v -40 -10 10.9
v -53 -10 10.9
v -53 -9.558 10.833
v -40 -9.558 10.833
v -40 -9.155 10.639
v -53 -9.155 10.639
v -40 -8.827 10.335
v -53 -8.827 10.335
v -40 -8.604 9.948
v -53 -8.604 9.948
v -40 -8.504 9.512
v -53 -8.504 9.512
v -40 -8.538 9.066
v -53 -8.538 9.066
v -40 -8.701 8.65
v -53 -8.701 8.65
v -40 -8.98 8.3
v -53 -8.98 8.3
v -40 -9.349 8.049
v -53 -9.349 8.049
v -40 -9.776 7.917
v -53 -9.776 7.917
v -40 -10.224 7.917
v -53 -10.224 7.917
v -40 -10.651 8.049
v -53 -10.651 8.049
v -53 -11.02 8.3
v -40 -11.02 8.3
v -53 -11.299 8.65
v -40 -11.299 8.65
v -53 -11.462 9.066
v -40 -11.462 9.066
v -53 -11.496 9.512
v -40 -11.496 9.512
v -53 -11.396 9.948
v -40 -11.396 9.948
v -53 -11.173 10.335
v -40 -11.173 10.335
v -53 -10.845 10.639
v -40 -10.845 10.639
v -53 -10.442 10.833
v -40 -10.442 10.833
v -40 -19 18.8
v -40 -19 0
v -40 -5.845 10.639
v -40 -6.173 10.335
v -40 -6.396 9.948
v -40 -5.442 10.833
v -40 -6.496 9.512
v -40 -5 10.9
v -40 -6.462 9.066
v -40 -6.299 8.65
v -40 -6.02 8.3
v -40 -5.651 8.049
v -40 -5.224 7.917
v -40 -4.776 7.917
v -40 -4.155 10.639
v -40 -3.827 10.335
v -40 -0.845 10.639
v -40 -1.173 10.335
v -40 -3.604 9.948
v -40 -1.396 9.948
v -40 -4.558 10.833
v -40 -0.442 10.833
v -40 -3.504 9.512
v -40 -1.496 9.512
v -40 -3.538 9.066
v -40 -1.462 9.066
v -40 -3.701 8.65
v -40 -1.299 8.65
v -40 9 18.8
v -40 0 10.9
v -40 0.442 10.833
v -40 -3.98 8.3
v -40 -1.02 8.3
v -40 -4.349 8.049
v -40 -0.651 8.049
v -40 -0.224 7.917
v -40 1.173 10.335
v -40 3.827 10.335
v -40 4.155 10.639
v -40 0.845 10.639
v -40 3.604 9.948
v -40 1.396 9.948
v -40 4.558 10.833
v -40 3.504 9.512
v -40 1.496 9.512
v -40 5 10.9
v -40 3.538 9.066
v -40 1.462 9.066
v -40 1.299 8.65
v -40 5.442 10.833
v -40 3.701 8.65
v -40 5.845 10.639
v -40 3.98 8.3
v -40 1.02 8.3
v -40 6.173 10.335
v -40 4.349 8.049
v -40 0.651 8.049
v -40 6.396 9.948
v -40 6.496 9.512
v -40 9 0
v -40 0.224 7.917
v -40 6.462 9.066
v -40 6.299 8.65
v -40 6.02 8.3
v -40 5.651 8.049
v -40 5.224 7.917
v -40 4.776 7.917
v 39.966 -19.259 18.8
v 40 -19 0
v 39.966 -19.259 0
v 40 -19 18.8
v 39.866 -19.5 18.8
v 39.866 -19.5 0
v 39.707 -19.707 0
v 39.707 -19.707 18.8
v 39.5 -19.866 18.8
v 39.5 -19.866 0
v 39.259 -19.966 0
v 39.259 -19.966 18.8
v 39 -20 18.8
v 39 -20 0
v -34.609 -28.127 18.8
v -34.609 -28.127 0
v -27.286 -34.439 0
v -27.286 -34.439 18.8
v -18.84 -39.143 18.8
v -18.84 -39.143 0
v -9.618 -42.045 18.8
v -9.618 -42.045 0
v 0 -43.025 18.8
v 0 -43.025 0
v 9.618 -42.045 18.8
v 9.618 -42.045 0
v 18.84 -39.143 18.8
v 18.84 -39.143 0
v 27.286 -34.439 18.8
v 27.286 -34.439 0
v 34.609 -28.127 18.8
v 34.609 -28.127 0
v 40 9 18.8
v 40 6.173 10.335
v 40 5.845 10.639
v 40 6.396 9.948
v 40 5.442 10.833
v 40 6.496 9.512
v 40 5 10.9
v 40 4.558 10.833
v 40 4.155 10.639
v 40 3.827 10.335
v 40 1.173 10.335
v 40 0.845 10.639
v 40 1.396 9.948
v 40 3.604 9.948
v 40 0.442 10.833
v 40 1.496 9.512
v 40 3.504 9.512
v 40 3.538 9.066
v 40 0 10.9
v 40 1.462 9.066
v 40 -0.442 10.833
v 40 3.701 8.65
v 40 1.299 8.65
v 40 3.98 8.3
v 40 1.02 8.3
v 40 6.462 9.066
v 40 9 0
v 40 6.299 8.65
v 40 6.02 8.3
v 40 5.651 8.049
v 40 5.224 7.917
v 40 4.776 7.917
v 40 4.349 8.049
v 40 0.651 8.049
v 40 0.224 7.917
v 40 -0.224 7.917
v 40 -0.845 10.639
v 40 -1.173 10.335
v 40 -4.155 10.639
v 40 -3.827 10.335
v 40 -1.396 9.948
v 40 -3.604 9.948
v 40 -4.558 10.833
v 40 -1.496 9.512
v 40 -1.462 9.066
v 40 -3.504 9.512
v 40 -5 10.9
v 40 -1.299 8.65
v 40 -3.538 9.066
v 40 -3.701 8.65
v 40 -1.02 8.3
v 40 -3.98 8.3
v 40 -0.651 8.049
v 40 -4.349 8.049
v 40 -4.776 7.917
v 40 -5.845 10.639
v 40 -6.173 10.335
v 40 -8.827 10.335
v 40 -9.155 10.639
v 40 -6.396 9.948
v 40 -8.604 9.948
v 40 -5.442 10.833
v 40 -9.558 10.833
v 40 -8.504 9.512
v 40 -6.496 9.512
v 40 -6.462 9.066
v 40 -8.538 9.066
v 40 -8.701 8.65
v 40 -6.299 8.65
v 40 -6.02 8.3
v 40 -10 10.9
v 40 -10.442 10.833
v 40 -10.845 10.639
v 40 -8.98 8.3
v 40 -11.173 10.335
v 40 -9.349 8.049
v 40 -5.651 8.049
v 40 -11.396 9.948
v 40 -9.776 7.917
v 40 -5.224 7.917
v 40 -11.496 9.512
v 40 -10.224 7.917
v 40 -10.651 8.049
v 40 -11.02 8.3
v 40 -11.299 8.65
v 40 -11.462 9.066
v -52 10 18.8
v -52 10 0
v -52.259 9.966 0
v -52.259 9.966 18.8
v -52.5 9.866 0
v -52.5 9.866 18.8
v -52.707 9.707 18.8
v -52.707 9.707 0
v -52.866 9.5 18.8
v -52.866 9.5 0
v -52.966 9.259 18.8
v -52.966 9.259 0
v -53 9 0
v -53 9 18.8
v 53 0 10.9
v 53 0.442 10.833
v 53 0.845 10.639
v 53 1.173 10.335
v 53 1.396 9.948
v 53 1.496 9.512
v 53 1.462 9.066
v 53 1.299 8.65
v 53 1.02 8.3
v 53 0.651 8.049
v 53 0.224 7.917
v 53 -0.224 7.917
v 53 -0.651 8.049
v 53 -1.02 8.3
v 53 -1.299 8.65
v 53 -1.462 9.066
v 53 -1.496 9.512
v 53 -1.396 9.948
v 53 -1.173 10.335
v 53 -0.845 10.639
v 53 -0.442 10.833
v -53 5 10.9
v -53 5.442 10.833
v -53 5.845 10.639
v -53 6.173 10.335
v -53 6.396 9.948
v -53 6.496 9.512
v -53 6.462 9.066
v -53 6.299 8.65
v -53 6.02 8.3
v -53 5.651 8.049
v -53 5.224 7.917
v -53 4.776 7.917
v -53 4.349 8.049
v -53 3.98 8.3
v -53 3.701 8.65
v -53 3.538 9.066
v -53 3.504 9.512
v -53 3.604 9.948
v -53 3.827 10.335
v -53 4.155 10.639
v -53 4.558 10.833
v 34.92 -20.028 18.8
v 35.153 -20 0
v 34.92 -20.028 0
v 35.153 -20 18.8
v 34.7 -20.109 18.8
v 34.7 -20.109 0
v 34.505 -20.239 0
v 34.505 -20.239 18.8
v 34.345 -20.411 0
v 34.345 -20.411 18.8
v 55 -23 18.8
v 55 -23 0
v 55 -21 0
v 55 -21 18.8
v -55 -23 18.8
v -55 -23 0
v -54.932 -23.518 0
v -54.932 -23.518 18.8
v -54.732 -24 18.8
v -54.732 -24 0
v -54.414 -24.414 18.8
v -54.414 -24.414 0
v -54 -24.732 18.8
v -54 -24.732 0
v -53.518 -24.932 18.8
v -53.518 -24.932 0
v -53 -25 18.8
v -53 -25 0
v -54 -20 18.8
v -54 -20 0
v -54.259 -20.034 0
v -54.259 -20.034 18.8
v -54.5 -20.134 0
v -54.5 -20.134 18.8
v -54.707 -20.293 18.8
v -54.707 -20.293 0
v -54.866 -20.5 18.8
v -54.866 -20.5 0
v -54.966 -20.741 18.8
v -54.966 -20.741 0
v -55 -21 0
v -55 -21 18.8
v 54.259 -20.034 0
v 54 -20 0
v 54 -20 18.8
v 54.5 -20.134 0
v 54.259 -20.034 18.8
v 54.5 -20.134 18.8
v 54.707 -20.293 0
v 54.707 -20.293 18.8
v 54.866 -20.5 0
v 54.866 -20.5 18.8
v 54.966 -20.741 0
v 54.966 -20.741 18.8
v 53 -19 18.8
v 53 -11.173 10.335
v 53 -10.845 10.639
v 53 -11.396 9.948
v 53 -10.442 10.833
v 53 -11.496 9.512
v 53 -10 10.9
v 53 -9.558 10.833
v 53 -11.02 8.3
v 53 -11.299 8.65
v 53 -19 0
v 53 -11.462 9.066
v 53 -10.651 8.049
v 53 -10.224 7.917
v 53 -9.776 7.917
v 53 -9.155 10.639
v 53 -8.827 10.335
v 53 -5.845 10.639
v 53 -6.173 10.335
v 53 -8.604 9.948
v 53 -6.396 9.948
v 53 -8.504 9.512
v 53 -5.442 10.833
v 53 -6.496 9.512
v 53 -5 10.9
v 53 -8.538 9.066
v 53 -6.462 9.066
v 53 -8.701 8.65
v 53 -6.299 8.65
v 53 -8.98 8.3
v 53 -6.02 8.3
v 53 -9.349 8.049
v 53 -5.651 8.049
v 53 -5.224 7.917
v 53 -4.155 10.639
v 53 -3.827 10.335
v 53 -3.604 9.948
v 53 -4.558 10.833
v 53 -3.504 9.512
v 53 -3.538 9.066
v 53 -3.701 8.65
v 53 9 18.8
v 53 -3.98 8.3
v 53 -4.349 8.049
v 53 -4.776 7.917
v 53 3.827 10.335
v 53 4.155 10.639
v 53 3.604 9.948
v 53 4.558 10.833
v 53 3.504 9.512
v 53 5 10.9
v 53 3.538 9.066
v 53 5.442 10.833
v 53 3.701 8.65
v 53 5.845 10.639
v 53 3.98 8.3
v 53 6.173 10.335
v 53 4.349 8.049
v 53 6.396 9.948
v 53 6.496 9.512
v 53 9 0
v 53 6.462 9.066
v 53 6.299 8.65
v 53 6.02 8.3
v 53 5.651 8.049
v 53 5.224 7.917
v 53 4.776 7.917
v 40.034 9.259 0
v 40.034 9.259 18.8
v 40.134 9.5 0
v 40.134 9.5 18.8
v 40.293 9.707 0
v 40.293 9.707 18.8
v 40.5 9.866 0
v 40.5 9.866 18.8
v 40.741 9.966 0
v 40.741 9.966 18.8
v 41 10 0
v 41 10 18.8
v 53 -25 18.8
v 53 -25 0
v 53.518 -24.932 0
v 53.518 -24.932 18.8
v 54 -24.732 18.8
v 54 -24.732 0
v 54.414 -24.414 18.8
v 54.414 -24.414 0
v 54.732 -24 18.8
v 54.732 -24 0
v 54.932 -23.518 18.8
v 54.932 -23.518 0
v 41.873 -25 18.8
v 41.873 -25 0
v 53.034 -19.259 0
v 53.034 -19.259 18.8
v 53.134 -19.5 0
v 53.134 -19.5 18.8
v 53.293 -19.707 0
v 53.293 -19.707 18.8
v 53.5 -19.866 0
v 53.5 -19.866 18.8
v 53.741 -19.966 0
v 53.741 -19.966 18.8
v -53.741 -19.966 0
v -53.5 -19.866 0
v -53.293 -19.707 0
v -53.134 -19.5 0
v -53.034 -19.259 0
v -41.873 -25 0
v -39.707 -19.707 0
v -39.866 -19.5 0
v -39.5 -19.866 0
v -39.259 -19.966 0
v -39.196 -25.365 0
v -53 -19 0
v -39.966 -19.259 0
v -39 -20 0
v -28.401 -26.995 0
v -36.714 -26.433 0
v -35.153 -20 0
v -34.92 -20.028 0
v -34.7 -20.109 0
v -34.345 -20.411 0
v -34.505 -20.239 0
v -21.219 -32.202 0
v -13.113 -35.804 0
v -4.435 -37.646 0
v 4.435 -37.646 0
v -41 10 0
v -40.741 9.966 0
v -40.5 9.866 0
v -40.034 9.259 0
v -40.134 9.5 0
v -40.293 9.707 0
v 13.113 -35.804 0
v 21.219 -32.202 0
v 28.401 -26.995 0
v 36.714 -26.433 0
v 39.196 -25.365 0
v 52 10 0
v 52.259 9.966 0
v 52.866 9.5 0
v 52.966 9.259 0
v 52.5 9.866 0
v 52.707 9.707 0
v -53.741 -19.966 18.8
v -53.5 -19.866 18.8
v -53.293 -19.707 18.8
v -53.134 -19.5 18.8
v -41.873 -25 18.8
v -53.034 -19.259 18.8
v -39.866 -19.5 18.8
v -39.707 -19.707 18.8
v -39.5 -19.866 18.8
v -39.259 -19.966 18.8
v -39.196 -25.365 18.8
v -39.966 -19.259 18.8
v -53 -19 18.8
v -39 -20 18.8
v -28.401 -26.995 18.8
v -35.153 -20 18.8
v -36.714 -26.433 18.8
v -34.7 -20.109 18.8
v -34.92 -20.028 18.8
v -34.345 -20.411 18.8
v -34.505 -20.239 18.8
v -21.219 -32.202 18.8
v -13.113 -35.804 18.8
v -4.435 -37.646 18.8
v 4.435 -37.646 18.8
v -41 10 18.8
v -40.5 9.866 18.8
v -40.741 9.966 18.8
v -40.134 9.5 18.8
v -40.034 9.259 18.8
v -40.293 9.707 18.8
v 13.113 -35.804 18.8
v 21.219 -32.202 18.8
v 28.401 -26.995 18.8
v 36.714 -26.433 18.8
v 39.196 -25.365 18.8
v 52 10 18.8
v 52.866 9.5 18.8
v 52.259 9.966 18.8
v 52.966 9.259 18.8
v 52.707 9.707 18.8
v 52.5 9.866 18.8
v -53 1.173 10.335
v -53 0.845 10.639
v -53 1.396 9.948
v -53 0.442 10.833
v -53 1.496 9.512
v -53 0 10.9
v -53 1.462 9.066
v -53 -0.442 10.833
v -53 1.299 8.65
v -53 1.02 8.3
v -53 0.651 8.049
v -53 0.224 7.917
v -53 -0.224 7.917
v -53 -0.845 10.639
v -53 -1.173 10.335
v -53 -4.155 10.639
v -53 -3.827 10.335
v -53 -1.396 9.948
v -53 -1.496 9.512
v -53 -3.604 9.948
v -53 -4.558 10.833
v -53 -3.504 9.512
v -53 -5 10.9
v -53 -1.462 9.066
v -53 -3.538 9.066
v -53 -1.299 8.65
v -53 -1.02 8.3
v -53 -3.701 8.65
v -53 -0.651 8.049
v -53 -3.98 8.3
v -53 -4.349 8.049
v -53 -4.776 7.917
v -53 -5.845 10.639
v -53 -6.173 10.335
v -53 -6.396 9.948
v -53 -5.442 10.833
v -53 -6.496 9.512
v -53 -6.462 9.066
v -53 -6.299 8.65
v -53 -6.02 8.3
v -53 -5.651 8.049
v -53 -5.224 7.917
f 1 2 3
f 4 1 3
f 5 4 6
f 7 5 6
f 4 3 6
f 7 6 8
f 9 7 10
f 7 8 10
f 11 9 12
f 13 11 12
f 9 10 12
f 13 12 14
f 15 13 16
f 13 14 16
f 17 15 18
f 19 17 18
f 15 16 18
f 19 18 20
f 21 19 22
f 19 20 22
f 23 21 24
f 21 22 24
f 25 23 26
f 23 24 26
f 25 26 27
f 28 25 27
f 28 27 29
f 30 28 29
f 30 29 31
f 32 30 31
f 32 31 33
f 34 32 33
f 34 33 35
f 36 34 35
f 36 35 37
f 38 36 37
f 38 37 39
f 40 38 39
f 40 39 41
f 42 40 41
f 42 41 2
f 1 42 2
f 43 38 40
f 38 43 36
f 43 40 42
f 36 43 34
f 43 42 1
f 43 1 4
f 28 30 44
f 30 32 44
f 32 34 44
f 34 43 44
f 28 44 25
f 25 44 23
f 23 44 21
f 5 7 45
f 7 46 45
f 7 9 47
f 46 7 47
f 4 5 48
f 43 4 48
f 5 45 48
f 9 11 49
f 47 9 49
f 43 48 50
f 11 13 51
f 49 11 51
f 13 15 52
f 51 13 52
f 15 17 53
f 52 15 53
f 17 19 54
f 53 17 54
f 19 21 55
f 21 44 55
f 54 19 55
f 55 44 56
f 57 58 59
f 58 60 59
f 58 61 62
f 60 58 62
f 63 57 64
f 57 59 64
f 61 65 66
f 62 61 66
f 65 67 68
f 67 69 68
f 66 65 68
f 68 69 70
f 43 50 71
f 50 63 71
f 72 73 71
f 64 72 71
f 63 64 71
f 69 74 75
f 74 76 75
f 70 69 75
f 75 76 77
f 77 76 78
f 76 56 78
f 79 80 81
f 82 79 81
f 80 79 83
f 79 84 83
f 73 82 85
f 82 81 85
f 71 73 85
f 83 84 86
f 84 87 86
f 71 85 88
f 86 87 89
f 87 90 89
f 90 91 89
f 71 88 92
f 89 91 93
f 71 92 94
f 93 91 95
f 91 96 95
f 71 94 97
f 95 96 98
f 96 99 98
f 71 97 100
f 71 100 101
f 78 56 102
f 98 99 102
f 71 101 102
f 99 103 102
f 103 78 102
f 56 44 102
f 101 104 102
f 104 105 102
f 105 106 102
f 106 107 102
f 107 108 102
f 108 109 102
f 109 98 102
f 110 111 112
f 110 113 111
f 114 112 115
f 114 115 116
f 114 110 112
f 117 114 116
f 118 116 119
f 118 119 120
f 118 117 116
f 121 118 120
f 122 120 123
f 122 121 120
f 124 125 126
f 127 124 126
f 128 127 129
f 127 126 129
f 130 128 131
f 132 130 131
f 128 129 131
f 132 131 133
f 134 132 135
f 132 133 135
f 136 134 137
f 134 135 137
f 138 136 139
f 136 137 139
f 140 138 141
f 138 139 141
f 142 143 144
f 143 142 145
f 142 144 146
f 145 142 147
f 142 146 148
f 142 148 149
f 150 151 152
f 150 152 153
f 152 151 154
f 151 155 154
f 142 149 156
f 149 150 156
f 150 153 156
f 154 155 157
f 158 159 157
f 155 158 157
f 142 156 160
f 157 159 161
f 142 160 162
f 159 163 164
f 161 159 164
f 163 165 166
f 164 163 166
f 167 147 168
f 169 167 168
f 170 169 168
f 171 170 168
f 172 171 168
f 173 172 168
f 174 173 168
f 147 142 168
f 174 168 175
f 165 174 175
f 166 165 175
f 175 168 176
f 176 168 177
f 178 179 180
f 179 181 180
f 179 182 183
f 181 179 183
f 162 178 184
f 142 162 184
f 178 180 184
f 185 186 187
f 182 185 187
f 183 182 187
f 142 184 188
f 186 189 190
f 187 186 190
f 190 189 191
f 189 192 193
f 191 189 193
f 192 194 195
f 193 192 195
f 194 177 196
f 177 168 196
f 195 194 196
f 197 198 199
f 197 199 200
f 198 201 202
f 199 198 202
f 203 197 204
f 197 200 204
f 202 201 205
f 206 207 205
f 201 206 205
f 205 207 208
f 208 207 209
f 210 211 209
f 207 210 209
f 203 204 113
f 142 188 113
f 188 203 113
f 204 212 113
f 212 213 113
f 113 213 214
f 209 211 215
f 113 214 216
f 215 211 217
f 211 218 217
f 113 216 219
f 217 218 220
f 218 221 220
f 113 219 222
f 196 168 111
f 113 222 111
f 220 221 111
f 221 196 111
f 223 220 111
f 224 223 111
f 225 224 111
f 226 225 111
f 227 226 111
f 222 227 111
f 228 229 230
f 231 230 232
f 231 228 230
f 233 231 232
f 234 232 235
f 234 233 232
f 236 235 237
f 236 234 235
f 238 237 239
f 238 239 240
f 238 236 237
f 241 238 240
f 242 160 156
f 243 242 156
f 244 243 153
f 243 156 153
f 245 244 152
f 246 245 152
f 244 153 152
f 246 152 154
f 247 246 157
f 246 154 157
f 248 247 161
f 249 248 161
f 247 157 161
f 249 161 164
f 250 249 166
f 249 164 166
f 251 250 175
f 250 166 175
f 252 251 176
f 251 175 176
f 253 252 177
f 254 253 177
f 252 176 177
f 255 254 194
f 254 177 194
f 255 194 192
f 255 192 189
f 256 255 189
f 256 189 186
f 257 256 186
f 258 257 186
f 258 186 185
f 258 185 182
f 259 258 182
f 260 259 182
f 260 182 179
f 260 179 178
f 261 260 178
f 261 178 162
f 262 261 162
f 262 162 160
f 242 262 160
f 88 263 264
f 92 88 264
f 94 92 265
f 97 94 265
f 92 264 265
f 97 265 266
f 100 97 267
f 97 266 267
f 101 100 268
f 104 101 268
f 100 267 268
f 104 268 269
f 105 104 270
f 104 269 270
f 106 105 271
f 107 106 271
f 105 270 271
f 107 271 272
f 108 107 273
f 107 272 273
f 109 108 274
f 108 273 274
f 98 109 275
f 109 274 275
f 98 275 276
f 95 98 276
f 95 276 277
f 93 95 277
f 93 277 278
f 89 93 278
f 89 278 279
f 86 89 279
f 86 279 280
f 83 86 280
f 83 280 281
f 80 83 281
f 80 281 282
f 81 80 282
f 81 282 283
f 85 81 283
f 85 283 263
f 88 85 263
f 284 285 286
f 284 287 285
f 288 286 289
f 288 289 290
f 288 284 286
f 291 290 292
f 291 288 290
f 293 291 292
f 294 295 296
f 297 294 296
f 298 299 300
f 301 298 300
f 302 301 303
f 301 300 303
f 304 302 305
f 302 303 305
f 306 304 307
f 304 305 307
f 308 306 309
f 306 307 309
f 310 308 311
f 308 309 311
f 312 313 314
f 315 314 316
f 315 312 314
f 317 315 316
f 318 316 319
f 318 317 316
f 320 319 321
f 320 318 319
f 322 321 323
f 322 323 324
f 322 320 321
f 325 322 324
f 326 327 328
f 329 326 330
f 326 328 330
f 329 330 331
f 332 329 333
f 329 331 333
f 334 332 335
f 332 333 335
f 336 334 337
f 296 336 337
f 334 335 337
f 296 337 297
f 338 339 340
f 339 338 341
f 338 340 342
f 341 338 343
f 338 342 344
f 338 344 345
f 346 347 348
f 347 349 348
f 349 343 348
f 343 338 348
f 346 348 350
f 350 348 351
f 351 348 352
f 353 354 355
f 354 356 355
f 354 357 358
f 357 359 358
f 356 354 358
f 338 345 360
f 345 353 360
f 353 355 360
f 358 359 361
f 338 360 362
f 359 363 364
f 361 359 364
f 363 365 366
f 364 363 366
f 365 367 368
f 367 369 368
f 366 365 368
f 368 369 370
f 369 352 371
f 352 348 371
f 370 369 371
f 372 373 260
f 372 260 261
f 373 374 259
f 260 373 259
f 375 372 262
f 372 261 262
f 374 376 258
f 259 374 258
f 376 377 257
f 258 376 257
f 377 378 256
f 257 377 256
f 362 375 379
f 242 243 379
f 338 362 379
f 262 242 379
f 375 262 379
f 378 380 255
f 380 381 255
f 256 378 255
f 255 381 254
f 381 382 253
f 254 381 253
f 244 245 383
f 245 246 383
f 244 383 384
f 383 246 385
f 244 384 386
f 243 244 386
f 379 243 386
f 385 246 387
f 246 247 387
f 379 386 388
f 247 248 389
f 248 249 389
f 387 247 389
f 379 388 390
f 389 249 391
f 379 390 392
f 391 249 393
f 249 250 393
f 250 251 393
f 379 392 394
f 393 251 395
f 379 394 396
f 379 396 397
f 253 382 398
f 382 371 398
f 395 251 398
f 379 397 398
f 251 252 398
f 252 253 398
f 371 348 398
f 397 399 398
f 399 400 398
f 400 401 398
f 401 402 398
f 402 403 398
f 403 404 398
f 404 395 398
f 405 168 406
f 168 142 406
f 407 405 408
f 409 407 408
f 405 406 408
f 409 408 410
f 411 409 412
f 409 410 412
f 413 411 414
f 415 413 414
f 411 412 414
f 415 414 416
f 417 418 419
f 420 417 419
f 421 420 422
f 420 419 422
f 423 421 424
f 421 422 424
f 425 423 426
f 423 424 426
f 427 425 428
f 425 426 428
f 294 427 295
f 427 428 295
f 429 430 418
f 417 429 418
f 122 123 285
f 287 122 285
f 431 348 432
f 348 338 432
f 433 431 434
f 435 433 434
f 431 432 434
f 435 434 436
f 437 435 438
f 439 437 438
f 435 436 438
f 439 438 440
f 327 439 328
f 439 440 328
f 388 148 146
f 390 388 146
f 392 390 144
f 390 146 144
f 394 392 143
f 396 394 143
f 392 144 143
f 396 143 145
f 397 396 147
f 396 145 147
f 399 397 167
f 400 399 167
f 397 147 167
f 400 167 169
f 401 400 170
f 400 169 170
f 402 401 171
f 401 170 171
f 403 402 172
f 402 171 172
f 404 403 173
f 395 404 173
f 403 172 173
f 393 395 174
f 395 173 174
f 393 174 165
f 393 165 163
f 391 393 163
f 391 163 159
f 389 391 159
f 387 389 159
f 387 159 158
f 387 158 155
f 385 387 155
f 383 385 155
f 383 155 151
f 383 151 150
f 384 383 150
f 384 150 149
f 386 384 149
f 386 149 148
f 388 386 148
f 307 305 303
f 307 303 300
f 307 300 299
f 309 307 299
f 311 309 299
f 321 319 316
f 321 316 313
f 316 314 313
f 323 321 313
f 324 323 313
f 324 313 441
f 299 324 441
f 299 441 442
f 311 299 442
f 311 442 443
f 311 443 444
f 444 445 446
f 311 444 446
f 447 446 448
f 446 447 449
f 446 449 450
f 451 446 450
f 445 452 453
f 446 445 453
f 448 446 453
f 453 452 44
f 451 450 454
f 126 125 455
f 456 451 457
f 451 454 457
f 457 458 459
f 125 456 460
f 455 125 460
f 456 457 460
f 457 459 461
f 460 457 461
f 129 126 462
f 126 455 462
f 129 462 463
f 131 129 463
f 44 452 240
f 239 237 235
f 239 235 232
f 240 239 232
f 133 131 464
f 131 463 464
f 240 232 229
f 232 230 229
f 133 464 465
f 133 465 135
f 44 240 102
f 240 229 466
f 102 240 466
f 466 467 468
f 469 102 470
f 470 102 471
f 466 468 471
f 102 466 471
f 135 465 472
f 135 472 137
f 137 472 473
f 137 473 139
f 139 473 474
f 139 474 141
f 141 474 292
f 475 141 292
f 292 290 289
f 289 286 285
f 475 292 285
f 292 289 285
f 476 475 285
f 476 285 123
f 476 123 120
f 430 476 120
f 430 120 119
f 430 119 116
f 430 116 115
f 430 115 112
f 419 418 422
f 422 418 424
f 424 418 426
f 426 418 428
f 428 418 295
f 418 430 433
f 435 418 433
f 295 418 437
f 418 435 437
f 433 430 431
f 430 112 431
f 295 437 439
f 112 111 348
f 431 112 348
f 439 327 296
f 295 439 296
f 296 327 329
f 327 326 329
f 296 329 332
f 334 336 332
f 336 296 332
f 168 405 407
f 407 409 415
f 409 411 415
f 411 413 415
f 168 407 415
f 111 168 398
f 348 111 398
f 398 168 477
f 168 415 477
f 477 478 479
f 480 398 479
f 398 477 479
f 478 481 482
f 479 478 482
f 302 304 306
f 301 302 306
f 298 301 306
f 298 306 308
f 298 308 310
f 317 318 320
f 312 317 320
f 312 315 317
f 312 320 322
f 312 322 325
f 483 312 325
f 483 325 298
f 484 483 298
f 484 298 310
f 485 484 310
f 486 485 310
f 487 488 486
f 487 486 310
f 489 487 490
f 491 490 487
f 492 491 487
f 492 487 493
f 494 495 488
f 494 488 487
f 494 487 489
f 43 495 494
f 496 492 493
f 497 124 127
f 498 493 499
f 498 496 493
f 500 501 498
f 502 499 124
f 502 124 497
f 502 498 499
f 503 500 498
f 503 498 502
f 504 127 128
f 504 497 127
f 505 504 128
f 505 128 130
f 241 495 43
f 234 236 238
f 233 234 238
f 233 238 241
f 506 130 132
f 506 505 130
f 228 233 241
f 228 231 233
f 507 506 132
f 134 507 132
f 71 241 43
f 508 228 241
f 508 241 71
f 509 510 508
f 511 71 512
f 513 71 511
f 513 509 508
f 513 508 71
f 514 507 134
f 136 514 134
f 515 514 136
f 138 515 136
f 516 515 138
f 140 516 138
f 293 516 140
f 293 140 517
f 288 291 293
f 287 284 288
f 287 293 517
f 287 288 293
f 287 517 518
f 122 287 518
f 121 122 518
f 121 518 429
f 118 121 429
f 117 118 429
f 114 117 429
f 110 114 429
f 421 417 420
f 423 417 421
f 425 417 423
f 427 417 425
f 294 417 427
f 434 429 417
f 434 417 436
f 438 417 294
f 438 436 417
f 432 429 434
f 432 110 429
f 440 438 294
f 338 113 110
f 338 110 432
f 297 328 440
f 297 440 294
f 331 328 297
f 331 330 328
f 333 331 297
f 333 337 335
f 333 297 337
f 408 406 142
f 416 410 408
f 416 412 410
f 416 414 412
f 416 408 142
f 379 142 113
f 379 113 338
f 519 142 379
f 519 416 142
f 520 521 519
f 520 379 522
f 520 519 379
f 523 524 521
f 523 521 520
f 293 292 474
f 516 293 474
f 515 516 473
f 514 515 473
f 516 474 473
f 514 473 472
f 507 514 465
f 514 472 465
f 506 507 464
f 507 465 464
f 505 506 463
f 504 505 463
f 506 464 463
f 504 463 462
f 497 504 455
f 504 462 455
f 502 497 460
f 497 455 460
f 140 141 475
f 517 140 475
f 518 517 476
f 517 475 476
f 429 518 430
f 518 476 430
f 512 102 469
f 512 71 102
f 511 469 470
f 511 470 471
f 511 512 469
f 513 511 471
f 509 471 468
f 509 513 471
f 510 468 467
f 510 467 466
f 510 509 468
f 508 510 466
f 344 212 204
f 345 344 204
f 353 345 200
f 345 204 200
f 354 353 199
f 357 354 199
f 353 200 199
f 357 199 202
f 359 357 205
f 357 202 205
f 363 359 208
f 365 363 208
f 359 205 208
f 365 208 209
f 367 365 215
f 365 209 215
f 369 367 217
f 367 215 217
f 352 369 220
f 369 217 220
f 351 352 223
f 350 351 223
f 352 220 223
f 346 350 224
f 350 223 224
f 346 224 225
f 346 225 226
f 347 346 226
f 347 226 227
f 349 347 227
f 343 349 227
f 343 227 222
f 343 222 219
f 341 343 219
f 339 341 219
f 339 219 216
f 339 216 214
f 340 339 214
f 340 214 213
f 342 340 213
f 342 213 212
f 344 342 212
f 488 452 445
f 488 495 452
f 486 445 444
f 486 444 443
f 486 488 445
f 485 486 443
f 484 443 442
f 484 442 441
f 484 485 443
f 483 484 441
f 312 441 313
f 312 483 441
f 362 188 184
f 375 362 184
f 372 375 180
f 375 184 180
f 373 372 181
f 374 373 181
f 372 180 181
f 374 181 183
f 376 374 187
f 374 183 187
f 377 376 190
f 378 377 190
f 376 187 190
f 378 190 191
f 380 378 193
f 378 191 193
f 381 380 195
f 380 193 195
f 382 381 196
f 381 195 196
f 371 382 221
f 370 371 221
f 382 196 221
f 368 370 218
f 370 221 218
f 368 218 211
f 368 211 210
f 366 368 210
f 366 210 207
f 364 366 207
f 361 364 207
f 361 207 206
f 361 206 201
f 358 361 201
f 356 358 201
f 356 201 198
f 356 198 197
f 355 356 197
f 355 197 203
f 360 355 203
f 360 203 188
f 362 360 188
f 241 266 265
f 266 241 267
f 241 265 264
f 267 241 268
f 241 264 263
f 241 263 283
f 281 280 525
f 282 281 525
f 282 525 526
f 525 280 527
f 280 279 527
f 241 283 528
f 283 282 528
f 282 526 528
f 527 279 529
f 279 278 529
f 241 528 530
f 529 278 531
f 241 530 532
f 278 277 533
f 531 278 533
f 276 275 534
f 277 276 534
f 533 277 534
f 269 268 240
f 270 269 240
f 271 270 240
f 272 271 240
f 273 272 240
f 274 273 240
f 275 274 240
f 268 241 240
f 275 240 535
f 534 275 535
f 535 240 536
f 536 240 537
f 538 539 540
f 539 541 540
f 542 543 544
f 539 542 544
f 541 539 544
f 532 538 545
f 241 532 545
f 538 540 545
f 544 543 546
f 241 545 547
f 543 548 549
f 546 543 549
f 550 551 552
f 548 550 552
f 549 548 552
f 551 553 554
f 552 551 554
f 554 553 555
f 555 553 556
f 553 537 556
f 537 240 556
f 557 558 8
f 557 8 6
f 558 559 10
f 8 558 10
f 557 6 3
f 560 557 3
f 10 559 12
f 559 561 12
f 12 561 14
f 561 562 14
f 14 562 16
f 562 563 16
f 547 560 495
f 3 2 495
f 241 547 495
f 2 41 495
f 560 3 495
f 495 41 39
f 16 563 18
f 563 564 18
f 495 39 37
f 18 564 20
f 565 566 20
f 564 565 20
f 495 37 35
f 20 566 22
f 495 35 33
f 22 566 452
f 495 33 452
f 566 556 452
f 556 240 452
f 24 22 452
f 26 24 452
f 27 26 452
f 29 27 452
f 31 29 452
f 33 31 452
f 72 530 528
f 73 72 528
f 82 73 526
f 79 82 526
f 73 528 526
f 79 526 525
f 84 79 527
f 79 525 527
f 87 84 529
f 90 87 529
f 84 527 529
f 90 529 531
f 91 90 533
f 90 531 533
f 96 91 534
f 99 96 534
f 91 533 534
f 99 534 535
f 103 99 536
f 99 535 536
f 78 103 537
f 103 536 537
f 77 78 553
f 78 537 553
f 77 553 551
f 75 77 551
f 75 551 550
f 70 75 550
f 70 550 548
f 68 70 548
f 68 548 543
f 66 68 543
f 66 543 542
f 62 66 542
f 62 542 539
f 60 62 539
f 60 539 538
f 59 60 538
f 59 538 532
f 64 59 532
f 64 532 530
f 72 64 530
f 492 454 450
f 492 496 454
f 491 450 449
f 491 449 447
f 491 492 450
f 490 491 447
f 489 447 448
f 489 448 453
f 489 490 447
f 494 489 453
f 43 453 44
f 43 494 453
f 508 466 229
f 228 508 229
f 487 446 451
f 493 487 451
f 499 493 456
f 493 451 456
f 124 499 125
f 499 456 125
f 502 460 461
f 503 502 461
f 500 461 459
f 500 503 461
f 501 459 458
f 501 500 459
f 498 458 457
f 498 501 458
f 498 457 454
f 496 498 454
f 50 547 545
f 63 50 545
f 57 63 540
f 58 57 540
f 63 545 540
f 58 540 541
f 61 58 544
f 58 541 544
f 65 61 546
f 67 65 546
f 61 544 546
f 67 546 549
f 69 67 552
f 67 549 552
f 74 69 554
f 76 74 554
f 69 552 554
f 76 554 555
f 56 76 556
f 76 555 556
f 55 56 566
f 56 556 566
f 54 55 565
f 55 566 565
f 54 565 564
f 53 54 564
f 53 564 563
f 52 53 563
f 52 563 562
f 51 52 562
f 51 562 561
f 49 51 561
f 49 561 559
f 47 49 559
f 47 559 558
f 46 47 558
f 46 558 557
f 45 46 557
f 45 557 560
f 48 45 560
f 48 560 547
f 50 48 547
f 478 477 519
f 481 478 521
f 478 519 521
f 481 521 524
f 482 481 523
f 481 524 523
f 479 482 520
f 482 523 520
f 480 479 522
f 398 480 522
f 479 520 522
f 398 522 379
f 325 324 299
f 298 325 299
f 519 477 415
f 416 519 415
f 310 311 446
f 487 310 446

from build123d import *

# Parameters (mm, degrees)
BOSS_EXTRUDE1_DEPTH = 18.8
SKETCH2_R           = 1.5
CUT_EXTRUDE1_DEPTH  = 168.8
FILLET1_R           = 1
FILLET2_R           = 1


with BuildPart() as part:
    # Sketch1 → Boss-Extrude1 (new body)
    with BuildSketch(Plane.XY):
        with BuildLine():
            Line((53, 10), (40, 10))
            Line((40, 10), (40, -20))
            Line((40, -20), (34.641016151, -20))
            ThreePointArc((34.641016151, -20), (0, -37.877855496), (-34.641016151, -20))
            Line((-34.641016151, -20), (-40, -20))
            Line((-40, -20), (-40, 10))
            Line((-40, 10), (-53, 10))
            Line((-53, 10), (-53, -20))
            Line((-53, -20), (-55, -20))
            Line((-55, -20), (-55, -23))
            ThreePointArc((-55, -23), (-54.414213562, -24.414213562), (-53, -25))
            Line((-53, -25), (-41.872771696, -25))
            ThreePointArc((-41.872771696, -25), (-37.918765594, -25.814912317), (-34.609193147, -28.12683285))
            ThreePointArc((-34.609193147, -28.12683285), (0, -43.025434322), (34.609193147, -28.12683285))
            ThreePointArc((34.609193147, -28.12683285), (37.918765594, -25.814912317), (41.872771696, -25))
            Line((41.872771696, -25), (53, -25))
            ThreePointArc((53, -25), (54.414213562, -24.414213562), (55, -23))
            Line((55, -23), (55, -20))
            Line((55, -20), (53, -20))
            Line((53, -20), (53, 10))
        make_face()
    extrude(amount=BOSS_EXTRUDE1_DEPTH)

    # Sketch2 → Cut-Extrude1 (cut)
    with BuildSketch(Plane.ZY.offset(53)):
        with Locations((9.4, -5)):
            Circle(SKETCH2_R)
        with Locations((9.4, 5)):
            Circle(SKETCH2_R)
        with Locations((9.4, 0)):
            Circle(SKETCH2_R)
        with Locations((9.4, -10)):
            Circle(SKETCH2_R)
    extrude(amount=-CUT_EXTRUDE1_DEPTH, mode=Mode.SUBTRACT)

    # Fillet1
    fillet1_edges = [part.edges().sort_by_distance(p)[0] for p in [
        (-40, -20, 9.4),
        (-34.641016151, -20, 9.4),
        (34.641016151, -20, 9.4),
        (40, -20, 9.4),
    ]]
    fillet(fillet1_edges, radius=FILLET1_R)

    # Fillet2
    fillet2_edges = [part.edges().sort_by_distance(p)[0] for p in [
        (-55, -20, 9.4),
        (-53, -20, 9.4),
        (-40, 10, 9.4),
        (-53, 10, 9.4),
        (55, -20, 9.4),
        (53, -20, 9.4),
        (53, 10, 9.4),
        (40, 10, 9.4),
    ]]
    fillet(fillet2_edges, radius=FILLET2_R - 0.0001)  # a hair under: the kernel refuses the full size


solid = part.part
